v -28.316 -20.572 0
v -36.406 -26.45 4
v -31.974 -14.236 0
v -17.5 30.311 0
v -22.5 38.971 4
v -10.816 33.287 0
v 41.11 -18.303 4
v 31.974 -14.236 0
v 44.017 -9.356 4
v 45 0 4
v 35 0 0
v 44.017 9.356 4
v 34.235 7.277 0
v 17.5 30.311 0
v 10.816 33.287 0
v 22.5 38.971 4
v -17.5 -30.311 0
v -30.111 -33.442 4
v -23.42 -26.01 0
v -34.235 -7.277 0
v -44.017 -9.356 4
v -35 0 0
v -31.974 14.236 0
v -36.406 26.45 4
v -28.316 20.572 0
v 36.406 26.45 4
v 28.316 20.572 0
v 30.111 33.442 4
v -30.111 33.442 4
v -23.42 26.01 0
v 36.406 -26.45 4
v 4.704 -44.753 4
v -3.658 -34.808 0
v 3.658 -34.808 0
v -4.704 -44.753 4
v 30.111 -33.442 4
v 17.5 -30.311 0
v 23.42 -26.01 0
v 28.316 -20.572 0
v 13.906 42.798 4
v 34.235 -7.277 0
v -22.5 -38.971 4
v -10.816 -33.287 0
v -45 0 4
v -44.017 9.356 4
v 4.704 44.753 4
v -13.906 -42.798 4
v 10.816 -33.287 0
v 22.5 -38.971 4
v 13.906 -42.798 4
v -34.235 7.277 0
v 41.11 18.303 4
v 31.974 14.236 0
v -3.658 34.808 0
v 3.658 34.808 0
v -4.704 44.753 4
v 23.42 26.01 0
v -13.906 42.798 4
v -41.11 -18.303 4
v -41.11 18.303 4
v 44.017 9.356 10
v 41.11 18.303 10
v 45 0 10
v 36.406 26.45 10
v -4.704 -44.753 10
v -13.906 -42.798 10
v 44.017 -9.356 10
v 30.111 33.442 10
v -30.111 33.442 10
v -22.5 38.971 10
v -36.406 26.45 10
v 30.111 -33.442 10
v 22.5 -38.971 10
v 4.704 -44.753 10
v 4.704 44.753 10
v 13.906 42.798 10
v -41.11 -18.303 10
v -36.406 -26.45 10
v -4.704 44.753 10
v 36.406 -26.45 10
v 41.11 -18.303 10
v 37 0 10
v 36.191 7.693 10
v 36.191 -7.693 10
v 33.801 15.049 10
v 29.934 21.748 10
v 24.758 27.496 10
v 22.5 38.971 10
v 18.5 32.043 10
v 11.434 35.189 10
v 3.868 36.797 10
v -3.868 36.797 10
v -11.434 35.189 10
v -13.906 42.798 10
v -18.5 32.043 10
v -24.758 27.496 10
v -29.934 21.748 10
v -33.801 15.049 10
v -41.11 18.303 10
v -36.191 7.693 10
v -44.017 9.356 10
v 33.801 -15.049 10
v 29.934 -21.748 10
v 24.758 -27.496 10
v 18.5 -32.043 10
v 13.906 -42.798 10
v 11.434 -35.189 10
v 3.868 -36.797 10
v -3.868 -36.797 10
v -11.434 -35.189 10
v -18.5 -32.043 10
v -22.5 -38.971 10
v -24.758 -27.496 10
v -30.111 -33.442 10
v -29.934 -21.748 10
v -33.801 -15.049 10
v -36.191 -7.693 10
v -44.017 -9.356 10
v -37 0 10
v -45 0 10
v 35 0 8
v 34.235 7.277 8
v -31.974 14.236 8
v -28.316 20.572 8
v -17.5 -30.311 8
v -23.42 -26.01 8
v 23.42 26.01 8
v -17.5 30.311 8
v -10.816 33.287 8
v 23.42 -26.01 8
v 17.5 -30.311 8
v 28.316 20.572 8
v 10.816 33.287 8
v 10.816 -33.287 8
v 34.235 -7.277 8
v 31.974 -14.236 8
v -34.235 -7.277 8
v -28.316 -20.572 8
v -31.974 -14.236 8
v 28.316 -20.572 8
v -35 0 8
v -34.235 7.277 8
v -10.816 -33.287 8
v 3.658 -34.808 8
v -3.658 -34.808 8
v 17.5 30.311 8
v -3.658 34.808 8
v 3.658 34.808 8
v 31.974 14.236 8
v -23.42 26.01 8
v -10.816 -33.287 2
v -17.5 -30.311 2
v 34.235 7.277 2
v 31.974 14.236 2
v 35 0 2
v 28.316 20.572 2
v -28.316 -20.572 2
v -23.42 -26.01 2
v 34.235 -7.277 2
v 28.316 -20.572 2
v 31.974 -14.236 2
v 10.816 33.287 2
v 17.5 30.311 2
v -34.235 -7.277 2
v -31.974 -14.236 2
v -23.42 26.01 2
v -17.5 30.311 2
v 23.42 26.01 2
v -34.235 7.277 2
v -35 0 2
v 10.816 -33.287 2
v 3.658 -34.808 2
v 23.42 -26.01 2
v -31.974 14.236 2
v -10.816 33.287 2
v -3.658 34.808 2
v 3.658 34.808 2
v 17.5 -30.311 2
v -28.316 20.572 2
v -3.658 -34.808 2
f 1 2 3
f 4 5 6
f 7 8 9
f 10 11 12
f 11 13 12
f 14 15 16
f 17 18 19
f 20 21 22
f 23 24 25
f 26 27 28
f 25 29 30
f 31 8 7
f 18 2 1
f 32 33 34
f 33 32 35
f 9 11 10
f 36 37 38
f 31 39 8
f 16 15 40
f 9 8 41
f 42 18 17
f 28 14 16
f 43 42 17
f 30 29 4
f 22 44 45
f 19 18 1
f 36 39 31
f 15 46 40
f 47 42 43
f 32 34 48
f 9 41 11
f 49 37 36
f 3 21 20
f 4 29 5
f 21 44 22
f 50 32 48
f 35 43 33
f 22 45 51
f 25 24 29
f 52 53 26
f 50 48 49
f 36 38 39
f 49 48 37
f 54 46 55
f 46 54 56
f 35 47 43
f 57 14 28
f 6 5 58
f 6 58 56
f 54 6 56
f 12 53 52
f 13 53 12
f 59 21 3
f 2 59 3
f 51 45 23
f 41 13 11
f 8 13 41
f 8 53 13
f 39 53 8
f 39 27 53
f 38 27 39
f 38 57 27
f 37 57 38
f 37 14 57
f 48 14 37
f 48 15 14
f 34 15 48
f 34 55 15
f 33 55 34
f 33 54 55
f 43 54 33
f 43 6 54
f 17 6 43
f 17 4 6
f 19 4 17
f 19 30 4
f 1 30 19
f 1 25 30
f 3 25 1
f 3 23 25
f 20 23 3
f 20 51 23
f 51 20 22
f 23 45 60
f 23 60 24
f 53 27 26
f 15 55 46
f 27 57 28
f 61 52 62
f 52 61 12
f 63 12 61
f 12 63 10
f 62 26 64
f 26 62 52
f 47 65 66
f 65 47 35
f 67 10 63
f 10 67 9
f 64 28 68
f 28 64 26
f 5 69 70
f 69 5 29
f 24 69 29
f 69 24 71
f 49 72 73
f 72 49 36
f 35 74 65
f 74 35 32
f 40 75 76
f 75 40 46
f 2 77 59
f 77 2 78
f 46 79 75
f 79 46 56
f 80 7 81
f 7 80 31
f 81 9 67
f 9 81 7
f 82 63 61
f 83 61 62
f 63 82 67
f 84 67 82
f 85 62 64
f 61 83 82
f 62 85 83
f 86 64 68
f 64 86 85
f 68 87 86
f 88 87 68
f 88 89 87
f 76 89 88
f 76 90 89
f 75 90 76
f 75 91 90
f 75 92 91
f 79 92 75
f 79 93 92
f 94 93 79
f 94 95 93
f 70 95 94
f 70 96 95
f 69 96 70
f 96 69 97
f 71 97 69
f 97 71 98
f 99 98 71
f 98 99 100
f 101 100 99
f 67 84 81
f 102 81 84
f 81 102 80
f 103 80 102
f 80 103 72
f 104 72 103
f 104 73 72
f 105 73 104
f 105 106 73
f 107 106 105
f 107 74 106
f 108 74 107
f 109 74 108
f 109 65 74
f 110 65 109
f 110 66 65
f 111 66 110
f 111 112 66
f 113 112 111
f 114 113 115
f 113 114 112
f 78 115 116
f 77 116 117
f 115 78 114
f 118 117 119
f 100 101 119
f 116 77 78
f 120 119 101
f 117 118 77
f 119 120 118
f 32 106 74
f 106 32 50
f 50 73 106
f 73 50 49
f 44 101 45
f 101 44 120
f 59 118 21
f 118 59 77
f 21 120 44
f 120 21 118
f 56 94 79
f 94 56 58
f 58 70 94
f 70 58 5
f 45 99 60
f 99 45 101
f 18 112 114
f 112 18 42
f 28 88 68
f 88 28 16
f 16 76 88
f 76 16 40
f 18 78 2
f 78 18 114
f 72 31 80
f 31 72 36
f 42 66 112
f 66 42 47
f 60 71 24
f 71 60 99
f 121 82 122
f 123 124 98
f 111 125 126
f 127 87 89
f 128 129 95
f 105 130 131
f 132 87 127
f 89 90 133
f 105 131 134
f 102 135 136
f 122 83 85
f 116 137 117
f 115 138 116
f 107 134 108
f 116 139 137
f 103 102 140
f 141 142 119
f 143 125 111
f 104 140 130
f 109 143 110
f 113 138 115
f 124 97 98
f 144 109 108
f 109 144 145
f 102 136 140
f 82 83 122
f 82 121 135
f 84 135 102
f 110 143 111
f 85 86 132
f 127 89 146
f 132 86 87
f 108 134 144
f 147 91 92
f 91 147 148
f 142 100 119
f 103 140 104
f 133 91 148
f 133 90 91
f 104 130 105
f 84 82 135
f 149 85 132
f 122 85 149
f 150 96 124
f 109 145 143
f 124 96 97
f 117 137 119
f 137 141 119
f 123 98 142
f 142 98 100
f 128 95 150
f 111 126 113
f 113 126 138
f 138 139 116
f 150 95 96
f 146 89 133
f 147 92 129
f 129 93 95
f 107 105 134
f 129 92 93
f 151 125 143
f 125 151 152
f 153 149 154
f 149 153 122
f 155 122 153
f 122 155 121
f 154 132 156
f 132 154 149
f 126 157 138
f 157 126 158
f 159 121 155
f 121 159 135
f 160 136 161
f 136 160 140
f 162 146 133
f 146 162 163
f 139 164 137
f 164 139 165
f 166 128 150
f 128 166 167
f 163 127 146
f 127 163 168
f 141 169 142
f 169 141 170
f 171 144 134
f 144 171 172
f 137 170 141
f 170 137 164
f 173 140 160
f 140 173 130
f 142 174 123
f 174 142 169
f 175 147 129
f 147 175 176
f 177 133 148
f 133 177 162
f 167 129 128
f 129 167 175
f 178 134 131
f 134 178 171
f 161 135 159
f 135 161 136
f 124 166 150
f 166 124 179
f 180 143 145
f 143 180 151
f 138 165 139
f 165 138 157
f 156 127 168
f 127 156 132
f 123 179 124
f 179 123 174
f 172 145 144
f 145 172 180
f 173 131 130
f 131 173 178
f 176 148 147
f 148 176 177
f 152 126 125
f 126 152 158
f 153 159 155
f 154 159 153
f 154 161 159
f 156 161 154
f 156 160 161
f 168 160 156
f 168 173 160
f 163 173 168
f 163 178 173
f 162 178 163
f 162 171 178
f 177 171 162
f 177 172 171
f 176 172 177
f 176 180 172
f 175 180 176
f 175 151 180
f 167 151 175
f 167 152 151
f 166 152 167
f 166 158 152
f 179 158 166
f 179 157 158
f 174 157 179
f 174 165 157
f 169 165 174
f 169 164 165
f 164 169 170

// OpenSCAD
//  Create a coaster that is 3D printable and will stack
// January 2014 - JWR
// 
// define parameters
// mm units
outside_diam = 90;
height = 10;
lip = 6;
rim = 10;
thick = 2;
//
difference () 
{ union()
{
cylinder(h = height - lip, r1 = (outside_diam / 2) - rim, r2 = (outside_diam / 2), center = false);
translate([0,0,height - lip])
cylinder(h = lip, r = (outside_diam / 2), center = false);
}
// inside
union()
{
translate([0,0,height-thick])
cylinder(h = thick, r1 = (outside_diam / 2) - rim, r2 = (outside_diam / 2) - rim + thick, center = false);
translate([0,0,thick])
cylinder(h = height- thick, r = (outside_diam / 2) - rim, center = false);
}}
